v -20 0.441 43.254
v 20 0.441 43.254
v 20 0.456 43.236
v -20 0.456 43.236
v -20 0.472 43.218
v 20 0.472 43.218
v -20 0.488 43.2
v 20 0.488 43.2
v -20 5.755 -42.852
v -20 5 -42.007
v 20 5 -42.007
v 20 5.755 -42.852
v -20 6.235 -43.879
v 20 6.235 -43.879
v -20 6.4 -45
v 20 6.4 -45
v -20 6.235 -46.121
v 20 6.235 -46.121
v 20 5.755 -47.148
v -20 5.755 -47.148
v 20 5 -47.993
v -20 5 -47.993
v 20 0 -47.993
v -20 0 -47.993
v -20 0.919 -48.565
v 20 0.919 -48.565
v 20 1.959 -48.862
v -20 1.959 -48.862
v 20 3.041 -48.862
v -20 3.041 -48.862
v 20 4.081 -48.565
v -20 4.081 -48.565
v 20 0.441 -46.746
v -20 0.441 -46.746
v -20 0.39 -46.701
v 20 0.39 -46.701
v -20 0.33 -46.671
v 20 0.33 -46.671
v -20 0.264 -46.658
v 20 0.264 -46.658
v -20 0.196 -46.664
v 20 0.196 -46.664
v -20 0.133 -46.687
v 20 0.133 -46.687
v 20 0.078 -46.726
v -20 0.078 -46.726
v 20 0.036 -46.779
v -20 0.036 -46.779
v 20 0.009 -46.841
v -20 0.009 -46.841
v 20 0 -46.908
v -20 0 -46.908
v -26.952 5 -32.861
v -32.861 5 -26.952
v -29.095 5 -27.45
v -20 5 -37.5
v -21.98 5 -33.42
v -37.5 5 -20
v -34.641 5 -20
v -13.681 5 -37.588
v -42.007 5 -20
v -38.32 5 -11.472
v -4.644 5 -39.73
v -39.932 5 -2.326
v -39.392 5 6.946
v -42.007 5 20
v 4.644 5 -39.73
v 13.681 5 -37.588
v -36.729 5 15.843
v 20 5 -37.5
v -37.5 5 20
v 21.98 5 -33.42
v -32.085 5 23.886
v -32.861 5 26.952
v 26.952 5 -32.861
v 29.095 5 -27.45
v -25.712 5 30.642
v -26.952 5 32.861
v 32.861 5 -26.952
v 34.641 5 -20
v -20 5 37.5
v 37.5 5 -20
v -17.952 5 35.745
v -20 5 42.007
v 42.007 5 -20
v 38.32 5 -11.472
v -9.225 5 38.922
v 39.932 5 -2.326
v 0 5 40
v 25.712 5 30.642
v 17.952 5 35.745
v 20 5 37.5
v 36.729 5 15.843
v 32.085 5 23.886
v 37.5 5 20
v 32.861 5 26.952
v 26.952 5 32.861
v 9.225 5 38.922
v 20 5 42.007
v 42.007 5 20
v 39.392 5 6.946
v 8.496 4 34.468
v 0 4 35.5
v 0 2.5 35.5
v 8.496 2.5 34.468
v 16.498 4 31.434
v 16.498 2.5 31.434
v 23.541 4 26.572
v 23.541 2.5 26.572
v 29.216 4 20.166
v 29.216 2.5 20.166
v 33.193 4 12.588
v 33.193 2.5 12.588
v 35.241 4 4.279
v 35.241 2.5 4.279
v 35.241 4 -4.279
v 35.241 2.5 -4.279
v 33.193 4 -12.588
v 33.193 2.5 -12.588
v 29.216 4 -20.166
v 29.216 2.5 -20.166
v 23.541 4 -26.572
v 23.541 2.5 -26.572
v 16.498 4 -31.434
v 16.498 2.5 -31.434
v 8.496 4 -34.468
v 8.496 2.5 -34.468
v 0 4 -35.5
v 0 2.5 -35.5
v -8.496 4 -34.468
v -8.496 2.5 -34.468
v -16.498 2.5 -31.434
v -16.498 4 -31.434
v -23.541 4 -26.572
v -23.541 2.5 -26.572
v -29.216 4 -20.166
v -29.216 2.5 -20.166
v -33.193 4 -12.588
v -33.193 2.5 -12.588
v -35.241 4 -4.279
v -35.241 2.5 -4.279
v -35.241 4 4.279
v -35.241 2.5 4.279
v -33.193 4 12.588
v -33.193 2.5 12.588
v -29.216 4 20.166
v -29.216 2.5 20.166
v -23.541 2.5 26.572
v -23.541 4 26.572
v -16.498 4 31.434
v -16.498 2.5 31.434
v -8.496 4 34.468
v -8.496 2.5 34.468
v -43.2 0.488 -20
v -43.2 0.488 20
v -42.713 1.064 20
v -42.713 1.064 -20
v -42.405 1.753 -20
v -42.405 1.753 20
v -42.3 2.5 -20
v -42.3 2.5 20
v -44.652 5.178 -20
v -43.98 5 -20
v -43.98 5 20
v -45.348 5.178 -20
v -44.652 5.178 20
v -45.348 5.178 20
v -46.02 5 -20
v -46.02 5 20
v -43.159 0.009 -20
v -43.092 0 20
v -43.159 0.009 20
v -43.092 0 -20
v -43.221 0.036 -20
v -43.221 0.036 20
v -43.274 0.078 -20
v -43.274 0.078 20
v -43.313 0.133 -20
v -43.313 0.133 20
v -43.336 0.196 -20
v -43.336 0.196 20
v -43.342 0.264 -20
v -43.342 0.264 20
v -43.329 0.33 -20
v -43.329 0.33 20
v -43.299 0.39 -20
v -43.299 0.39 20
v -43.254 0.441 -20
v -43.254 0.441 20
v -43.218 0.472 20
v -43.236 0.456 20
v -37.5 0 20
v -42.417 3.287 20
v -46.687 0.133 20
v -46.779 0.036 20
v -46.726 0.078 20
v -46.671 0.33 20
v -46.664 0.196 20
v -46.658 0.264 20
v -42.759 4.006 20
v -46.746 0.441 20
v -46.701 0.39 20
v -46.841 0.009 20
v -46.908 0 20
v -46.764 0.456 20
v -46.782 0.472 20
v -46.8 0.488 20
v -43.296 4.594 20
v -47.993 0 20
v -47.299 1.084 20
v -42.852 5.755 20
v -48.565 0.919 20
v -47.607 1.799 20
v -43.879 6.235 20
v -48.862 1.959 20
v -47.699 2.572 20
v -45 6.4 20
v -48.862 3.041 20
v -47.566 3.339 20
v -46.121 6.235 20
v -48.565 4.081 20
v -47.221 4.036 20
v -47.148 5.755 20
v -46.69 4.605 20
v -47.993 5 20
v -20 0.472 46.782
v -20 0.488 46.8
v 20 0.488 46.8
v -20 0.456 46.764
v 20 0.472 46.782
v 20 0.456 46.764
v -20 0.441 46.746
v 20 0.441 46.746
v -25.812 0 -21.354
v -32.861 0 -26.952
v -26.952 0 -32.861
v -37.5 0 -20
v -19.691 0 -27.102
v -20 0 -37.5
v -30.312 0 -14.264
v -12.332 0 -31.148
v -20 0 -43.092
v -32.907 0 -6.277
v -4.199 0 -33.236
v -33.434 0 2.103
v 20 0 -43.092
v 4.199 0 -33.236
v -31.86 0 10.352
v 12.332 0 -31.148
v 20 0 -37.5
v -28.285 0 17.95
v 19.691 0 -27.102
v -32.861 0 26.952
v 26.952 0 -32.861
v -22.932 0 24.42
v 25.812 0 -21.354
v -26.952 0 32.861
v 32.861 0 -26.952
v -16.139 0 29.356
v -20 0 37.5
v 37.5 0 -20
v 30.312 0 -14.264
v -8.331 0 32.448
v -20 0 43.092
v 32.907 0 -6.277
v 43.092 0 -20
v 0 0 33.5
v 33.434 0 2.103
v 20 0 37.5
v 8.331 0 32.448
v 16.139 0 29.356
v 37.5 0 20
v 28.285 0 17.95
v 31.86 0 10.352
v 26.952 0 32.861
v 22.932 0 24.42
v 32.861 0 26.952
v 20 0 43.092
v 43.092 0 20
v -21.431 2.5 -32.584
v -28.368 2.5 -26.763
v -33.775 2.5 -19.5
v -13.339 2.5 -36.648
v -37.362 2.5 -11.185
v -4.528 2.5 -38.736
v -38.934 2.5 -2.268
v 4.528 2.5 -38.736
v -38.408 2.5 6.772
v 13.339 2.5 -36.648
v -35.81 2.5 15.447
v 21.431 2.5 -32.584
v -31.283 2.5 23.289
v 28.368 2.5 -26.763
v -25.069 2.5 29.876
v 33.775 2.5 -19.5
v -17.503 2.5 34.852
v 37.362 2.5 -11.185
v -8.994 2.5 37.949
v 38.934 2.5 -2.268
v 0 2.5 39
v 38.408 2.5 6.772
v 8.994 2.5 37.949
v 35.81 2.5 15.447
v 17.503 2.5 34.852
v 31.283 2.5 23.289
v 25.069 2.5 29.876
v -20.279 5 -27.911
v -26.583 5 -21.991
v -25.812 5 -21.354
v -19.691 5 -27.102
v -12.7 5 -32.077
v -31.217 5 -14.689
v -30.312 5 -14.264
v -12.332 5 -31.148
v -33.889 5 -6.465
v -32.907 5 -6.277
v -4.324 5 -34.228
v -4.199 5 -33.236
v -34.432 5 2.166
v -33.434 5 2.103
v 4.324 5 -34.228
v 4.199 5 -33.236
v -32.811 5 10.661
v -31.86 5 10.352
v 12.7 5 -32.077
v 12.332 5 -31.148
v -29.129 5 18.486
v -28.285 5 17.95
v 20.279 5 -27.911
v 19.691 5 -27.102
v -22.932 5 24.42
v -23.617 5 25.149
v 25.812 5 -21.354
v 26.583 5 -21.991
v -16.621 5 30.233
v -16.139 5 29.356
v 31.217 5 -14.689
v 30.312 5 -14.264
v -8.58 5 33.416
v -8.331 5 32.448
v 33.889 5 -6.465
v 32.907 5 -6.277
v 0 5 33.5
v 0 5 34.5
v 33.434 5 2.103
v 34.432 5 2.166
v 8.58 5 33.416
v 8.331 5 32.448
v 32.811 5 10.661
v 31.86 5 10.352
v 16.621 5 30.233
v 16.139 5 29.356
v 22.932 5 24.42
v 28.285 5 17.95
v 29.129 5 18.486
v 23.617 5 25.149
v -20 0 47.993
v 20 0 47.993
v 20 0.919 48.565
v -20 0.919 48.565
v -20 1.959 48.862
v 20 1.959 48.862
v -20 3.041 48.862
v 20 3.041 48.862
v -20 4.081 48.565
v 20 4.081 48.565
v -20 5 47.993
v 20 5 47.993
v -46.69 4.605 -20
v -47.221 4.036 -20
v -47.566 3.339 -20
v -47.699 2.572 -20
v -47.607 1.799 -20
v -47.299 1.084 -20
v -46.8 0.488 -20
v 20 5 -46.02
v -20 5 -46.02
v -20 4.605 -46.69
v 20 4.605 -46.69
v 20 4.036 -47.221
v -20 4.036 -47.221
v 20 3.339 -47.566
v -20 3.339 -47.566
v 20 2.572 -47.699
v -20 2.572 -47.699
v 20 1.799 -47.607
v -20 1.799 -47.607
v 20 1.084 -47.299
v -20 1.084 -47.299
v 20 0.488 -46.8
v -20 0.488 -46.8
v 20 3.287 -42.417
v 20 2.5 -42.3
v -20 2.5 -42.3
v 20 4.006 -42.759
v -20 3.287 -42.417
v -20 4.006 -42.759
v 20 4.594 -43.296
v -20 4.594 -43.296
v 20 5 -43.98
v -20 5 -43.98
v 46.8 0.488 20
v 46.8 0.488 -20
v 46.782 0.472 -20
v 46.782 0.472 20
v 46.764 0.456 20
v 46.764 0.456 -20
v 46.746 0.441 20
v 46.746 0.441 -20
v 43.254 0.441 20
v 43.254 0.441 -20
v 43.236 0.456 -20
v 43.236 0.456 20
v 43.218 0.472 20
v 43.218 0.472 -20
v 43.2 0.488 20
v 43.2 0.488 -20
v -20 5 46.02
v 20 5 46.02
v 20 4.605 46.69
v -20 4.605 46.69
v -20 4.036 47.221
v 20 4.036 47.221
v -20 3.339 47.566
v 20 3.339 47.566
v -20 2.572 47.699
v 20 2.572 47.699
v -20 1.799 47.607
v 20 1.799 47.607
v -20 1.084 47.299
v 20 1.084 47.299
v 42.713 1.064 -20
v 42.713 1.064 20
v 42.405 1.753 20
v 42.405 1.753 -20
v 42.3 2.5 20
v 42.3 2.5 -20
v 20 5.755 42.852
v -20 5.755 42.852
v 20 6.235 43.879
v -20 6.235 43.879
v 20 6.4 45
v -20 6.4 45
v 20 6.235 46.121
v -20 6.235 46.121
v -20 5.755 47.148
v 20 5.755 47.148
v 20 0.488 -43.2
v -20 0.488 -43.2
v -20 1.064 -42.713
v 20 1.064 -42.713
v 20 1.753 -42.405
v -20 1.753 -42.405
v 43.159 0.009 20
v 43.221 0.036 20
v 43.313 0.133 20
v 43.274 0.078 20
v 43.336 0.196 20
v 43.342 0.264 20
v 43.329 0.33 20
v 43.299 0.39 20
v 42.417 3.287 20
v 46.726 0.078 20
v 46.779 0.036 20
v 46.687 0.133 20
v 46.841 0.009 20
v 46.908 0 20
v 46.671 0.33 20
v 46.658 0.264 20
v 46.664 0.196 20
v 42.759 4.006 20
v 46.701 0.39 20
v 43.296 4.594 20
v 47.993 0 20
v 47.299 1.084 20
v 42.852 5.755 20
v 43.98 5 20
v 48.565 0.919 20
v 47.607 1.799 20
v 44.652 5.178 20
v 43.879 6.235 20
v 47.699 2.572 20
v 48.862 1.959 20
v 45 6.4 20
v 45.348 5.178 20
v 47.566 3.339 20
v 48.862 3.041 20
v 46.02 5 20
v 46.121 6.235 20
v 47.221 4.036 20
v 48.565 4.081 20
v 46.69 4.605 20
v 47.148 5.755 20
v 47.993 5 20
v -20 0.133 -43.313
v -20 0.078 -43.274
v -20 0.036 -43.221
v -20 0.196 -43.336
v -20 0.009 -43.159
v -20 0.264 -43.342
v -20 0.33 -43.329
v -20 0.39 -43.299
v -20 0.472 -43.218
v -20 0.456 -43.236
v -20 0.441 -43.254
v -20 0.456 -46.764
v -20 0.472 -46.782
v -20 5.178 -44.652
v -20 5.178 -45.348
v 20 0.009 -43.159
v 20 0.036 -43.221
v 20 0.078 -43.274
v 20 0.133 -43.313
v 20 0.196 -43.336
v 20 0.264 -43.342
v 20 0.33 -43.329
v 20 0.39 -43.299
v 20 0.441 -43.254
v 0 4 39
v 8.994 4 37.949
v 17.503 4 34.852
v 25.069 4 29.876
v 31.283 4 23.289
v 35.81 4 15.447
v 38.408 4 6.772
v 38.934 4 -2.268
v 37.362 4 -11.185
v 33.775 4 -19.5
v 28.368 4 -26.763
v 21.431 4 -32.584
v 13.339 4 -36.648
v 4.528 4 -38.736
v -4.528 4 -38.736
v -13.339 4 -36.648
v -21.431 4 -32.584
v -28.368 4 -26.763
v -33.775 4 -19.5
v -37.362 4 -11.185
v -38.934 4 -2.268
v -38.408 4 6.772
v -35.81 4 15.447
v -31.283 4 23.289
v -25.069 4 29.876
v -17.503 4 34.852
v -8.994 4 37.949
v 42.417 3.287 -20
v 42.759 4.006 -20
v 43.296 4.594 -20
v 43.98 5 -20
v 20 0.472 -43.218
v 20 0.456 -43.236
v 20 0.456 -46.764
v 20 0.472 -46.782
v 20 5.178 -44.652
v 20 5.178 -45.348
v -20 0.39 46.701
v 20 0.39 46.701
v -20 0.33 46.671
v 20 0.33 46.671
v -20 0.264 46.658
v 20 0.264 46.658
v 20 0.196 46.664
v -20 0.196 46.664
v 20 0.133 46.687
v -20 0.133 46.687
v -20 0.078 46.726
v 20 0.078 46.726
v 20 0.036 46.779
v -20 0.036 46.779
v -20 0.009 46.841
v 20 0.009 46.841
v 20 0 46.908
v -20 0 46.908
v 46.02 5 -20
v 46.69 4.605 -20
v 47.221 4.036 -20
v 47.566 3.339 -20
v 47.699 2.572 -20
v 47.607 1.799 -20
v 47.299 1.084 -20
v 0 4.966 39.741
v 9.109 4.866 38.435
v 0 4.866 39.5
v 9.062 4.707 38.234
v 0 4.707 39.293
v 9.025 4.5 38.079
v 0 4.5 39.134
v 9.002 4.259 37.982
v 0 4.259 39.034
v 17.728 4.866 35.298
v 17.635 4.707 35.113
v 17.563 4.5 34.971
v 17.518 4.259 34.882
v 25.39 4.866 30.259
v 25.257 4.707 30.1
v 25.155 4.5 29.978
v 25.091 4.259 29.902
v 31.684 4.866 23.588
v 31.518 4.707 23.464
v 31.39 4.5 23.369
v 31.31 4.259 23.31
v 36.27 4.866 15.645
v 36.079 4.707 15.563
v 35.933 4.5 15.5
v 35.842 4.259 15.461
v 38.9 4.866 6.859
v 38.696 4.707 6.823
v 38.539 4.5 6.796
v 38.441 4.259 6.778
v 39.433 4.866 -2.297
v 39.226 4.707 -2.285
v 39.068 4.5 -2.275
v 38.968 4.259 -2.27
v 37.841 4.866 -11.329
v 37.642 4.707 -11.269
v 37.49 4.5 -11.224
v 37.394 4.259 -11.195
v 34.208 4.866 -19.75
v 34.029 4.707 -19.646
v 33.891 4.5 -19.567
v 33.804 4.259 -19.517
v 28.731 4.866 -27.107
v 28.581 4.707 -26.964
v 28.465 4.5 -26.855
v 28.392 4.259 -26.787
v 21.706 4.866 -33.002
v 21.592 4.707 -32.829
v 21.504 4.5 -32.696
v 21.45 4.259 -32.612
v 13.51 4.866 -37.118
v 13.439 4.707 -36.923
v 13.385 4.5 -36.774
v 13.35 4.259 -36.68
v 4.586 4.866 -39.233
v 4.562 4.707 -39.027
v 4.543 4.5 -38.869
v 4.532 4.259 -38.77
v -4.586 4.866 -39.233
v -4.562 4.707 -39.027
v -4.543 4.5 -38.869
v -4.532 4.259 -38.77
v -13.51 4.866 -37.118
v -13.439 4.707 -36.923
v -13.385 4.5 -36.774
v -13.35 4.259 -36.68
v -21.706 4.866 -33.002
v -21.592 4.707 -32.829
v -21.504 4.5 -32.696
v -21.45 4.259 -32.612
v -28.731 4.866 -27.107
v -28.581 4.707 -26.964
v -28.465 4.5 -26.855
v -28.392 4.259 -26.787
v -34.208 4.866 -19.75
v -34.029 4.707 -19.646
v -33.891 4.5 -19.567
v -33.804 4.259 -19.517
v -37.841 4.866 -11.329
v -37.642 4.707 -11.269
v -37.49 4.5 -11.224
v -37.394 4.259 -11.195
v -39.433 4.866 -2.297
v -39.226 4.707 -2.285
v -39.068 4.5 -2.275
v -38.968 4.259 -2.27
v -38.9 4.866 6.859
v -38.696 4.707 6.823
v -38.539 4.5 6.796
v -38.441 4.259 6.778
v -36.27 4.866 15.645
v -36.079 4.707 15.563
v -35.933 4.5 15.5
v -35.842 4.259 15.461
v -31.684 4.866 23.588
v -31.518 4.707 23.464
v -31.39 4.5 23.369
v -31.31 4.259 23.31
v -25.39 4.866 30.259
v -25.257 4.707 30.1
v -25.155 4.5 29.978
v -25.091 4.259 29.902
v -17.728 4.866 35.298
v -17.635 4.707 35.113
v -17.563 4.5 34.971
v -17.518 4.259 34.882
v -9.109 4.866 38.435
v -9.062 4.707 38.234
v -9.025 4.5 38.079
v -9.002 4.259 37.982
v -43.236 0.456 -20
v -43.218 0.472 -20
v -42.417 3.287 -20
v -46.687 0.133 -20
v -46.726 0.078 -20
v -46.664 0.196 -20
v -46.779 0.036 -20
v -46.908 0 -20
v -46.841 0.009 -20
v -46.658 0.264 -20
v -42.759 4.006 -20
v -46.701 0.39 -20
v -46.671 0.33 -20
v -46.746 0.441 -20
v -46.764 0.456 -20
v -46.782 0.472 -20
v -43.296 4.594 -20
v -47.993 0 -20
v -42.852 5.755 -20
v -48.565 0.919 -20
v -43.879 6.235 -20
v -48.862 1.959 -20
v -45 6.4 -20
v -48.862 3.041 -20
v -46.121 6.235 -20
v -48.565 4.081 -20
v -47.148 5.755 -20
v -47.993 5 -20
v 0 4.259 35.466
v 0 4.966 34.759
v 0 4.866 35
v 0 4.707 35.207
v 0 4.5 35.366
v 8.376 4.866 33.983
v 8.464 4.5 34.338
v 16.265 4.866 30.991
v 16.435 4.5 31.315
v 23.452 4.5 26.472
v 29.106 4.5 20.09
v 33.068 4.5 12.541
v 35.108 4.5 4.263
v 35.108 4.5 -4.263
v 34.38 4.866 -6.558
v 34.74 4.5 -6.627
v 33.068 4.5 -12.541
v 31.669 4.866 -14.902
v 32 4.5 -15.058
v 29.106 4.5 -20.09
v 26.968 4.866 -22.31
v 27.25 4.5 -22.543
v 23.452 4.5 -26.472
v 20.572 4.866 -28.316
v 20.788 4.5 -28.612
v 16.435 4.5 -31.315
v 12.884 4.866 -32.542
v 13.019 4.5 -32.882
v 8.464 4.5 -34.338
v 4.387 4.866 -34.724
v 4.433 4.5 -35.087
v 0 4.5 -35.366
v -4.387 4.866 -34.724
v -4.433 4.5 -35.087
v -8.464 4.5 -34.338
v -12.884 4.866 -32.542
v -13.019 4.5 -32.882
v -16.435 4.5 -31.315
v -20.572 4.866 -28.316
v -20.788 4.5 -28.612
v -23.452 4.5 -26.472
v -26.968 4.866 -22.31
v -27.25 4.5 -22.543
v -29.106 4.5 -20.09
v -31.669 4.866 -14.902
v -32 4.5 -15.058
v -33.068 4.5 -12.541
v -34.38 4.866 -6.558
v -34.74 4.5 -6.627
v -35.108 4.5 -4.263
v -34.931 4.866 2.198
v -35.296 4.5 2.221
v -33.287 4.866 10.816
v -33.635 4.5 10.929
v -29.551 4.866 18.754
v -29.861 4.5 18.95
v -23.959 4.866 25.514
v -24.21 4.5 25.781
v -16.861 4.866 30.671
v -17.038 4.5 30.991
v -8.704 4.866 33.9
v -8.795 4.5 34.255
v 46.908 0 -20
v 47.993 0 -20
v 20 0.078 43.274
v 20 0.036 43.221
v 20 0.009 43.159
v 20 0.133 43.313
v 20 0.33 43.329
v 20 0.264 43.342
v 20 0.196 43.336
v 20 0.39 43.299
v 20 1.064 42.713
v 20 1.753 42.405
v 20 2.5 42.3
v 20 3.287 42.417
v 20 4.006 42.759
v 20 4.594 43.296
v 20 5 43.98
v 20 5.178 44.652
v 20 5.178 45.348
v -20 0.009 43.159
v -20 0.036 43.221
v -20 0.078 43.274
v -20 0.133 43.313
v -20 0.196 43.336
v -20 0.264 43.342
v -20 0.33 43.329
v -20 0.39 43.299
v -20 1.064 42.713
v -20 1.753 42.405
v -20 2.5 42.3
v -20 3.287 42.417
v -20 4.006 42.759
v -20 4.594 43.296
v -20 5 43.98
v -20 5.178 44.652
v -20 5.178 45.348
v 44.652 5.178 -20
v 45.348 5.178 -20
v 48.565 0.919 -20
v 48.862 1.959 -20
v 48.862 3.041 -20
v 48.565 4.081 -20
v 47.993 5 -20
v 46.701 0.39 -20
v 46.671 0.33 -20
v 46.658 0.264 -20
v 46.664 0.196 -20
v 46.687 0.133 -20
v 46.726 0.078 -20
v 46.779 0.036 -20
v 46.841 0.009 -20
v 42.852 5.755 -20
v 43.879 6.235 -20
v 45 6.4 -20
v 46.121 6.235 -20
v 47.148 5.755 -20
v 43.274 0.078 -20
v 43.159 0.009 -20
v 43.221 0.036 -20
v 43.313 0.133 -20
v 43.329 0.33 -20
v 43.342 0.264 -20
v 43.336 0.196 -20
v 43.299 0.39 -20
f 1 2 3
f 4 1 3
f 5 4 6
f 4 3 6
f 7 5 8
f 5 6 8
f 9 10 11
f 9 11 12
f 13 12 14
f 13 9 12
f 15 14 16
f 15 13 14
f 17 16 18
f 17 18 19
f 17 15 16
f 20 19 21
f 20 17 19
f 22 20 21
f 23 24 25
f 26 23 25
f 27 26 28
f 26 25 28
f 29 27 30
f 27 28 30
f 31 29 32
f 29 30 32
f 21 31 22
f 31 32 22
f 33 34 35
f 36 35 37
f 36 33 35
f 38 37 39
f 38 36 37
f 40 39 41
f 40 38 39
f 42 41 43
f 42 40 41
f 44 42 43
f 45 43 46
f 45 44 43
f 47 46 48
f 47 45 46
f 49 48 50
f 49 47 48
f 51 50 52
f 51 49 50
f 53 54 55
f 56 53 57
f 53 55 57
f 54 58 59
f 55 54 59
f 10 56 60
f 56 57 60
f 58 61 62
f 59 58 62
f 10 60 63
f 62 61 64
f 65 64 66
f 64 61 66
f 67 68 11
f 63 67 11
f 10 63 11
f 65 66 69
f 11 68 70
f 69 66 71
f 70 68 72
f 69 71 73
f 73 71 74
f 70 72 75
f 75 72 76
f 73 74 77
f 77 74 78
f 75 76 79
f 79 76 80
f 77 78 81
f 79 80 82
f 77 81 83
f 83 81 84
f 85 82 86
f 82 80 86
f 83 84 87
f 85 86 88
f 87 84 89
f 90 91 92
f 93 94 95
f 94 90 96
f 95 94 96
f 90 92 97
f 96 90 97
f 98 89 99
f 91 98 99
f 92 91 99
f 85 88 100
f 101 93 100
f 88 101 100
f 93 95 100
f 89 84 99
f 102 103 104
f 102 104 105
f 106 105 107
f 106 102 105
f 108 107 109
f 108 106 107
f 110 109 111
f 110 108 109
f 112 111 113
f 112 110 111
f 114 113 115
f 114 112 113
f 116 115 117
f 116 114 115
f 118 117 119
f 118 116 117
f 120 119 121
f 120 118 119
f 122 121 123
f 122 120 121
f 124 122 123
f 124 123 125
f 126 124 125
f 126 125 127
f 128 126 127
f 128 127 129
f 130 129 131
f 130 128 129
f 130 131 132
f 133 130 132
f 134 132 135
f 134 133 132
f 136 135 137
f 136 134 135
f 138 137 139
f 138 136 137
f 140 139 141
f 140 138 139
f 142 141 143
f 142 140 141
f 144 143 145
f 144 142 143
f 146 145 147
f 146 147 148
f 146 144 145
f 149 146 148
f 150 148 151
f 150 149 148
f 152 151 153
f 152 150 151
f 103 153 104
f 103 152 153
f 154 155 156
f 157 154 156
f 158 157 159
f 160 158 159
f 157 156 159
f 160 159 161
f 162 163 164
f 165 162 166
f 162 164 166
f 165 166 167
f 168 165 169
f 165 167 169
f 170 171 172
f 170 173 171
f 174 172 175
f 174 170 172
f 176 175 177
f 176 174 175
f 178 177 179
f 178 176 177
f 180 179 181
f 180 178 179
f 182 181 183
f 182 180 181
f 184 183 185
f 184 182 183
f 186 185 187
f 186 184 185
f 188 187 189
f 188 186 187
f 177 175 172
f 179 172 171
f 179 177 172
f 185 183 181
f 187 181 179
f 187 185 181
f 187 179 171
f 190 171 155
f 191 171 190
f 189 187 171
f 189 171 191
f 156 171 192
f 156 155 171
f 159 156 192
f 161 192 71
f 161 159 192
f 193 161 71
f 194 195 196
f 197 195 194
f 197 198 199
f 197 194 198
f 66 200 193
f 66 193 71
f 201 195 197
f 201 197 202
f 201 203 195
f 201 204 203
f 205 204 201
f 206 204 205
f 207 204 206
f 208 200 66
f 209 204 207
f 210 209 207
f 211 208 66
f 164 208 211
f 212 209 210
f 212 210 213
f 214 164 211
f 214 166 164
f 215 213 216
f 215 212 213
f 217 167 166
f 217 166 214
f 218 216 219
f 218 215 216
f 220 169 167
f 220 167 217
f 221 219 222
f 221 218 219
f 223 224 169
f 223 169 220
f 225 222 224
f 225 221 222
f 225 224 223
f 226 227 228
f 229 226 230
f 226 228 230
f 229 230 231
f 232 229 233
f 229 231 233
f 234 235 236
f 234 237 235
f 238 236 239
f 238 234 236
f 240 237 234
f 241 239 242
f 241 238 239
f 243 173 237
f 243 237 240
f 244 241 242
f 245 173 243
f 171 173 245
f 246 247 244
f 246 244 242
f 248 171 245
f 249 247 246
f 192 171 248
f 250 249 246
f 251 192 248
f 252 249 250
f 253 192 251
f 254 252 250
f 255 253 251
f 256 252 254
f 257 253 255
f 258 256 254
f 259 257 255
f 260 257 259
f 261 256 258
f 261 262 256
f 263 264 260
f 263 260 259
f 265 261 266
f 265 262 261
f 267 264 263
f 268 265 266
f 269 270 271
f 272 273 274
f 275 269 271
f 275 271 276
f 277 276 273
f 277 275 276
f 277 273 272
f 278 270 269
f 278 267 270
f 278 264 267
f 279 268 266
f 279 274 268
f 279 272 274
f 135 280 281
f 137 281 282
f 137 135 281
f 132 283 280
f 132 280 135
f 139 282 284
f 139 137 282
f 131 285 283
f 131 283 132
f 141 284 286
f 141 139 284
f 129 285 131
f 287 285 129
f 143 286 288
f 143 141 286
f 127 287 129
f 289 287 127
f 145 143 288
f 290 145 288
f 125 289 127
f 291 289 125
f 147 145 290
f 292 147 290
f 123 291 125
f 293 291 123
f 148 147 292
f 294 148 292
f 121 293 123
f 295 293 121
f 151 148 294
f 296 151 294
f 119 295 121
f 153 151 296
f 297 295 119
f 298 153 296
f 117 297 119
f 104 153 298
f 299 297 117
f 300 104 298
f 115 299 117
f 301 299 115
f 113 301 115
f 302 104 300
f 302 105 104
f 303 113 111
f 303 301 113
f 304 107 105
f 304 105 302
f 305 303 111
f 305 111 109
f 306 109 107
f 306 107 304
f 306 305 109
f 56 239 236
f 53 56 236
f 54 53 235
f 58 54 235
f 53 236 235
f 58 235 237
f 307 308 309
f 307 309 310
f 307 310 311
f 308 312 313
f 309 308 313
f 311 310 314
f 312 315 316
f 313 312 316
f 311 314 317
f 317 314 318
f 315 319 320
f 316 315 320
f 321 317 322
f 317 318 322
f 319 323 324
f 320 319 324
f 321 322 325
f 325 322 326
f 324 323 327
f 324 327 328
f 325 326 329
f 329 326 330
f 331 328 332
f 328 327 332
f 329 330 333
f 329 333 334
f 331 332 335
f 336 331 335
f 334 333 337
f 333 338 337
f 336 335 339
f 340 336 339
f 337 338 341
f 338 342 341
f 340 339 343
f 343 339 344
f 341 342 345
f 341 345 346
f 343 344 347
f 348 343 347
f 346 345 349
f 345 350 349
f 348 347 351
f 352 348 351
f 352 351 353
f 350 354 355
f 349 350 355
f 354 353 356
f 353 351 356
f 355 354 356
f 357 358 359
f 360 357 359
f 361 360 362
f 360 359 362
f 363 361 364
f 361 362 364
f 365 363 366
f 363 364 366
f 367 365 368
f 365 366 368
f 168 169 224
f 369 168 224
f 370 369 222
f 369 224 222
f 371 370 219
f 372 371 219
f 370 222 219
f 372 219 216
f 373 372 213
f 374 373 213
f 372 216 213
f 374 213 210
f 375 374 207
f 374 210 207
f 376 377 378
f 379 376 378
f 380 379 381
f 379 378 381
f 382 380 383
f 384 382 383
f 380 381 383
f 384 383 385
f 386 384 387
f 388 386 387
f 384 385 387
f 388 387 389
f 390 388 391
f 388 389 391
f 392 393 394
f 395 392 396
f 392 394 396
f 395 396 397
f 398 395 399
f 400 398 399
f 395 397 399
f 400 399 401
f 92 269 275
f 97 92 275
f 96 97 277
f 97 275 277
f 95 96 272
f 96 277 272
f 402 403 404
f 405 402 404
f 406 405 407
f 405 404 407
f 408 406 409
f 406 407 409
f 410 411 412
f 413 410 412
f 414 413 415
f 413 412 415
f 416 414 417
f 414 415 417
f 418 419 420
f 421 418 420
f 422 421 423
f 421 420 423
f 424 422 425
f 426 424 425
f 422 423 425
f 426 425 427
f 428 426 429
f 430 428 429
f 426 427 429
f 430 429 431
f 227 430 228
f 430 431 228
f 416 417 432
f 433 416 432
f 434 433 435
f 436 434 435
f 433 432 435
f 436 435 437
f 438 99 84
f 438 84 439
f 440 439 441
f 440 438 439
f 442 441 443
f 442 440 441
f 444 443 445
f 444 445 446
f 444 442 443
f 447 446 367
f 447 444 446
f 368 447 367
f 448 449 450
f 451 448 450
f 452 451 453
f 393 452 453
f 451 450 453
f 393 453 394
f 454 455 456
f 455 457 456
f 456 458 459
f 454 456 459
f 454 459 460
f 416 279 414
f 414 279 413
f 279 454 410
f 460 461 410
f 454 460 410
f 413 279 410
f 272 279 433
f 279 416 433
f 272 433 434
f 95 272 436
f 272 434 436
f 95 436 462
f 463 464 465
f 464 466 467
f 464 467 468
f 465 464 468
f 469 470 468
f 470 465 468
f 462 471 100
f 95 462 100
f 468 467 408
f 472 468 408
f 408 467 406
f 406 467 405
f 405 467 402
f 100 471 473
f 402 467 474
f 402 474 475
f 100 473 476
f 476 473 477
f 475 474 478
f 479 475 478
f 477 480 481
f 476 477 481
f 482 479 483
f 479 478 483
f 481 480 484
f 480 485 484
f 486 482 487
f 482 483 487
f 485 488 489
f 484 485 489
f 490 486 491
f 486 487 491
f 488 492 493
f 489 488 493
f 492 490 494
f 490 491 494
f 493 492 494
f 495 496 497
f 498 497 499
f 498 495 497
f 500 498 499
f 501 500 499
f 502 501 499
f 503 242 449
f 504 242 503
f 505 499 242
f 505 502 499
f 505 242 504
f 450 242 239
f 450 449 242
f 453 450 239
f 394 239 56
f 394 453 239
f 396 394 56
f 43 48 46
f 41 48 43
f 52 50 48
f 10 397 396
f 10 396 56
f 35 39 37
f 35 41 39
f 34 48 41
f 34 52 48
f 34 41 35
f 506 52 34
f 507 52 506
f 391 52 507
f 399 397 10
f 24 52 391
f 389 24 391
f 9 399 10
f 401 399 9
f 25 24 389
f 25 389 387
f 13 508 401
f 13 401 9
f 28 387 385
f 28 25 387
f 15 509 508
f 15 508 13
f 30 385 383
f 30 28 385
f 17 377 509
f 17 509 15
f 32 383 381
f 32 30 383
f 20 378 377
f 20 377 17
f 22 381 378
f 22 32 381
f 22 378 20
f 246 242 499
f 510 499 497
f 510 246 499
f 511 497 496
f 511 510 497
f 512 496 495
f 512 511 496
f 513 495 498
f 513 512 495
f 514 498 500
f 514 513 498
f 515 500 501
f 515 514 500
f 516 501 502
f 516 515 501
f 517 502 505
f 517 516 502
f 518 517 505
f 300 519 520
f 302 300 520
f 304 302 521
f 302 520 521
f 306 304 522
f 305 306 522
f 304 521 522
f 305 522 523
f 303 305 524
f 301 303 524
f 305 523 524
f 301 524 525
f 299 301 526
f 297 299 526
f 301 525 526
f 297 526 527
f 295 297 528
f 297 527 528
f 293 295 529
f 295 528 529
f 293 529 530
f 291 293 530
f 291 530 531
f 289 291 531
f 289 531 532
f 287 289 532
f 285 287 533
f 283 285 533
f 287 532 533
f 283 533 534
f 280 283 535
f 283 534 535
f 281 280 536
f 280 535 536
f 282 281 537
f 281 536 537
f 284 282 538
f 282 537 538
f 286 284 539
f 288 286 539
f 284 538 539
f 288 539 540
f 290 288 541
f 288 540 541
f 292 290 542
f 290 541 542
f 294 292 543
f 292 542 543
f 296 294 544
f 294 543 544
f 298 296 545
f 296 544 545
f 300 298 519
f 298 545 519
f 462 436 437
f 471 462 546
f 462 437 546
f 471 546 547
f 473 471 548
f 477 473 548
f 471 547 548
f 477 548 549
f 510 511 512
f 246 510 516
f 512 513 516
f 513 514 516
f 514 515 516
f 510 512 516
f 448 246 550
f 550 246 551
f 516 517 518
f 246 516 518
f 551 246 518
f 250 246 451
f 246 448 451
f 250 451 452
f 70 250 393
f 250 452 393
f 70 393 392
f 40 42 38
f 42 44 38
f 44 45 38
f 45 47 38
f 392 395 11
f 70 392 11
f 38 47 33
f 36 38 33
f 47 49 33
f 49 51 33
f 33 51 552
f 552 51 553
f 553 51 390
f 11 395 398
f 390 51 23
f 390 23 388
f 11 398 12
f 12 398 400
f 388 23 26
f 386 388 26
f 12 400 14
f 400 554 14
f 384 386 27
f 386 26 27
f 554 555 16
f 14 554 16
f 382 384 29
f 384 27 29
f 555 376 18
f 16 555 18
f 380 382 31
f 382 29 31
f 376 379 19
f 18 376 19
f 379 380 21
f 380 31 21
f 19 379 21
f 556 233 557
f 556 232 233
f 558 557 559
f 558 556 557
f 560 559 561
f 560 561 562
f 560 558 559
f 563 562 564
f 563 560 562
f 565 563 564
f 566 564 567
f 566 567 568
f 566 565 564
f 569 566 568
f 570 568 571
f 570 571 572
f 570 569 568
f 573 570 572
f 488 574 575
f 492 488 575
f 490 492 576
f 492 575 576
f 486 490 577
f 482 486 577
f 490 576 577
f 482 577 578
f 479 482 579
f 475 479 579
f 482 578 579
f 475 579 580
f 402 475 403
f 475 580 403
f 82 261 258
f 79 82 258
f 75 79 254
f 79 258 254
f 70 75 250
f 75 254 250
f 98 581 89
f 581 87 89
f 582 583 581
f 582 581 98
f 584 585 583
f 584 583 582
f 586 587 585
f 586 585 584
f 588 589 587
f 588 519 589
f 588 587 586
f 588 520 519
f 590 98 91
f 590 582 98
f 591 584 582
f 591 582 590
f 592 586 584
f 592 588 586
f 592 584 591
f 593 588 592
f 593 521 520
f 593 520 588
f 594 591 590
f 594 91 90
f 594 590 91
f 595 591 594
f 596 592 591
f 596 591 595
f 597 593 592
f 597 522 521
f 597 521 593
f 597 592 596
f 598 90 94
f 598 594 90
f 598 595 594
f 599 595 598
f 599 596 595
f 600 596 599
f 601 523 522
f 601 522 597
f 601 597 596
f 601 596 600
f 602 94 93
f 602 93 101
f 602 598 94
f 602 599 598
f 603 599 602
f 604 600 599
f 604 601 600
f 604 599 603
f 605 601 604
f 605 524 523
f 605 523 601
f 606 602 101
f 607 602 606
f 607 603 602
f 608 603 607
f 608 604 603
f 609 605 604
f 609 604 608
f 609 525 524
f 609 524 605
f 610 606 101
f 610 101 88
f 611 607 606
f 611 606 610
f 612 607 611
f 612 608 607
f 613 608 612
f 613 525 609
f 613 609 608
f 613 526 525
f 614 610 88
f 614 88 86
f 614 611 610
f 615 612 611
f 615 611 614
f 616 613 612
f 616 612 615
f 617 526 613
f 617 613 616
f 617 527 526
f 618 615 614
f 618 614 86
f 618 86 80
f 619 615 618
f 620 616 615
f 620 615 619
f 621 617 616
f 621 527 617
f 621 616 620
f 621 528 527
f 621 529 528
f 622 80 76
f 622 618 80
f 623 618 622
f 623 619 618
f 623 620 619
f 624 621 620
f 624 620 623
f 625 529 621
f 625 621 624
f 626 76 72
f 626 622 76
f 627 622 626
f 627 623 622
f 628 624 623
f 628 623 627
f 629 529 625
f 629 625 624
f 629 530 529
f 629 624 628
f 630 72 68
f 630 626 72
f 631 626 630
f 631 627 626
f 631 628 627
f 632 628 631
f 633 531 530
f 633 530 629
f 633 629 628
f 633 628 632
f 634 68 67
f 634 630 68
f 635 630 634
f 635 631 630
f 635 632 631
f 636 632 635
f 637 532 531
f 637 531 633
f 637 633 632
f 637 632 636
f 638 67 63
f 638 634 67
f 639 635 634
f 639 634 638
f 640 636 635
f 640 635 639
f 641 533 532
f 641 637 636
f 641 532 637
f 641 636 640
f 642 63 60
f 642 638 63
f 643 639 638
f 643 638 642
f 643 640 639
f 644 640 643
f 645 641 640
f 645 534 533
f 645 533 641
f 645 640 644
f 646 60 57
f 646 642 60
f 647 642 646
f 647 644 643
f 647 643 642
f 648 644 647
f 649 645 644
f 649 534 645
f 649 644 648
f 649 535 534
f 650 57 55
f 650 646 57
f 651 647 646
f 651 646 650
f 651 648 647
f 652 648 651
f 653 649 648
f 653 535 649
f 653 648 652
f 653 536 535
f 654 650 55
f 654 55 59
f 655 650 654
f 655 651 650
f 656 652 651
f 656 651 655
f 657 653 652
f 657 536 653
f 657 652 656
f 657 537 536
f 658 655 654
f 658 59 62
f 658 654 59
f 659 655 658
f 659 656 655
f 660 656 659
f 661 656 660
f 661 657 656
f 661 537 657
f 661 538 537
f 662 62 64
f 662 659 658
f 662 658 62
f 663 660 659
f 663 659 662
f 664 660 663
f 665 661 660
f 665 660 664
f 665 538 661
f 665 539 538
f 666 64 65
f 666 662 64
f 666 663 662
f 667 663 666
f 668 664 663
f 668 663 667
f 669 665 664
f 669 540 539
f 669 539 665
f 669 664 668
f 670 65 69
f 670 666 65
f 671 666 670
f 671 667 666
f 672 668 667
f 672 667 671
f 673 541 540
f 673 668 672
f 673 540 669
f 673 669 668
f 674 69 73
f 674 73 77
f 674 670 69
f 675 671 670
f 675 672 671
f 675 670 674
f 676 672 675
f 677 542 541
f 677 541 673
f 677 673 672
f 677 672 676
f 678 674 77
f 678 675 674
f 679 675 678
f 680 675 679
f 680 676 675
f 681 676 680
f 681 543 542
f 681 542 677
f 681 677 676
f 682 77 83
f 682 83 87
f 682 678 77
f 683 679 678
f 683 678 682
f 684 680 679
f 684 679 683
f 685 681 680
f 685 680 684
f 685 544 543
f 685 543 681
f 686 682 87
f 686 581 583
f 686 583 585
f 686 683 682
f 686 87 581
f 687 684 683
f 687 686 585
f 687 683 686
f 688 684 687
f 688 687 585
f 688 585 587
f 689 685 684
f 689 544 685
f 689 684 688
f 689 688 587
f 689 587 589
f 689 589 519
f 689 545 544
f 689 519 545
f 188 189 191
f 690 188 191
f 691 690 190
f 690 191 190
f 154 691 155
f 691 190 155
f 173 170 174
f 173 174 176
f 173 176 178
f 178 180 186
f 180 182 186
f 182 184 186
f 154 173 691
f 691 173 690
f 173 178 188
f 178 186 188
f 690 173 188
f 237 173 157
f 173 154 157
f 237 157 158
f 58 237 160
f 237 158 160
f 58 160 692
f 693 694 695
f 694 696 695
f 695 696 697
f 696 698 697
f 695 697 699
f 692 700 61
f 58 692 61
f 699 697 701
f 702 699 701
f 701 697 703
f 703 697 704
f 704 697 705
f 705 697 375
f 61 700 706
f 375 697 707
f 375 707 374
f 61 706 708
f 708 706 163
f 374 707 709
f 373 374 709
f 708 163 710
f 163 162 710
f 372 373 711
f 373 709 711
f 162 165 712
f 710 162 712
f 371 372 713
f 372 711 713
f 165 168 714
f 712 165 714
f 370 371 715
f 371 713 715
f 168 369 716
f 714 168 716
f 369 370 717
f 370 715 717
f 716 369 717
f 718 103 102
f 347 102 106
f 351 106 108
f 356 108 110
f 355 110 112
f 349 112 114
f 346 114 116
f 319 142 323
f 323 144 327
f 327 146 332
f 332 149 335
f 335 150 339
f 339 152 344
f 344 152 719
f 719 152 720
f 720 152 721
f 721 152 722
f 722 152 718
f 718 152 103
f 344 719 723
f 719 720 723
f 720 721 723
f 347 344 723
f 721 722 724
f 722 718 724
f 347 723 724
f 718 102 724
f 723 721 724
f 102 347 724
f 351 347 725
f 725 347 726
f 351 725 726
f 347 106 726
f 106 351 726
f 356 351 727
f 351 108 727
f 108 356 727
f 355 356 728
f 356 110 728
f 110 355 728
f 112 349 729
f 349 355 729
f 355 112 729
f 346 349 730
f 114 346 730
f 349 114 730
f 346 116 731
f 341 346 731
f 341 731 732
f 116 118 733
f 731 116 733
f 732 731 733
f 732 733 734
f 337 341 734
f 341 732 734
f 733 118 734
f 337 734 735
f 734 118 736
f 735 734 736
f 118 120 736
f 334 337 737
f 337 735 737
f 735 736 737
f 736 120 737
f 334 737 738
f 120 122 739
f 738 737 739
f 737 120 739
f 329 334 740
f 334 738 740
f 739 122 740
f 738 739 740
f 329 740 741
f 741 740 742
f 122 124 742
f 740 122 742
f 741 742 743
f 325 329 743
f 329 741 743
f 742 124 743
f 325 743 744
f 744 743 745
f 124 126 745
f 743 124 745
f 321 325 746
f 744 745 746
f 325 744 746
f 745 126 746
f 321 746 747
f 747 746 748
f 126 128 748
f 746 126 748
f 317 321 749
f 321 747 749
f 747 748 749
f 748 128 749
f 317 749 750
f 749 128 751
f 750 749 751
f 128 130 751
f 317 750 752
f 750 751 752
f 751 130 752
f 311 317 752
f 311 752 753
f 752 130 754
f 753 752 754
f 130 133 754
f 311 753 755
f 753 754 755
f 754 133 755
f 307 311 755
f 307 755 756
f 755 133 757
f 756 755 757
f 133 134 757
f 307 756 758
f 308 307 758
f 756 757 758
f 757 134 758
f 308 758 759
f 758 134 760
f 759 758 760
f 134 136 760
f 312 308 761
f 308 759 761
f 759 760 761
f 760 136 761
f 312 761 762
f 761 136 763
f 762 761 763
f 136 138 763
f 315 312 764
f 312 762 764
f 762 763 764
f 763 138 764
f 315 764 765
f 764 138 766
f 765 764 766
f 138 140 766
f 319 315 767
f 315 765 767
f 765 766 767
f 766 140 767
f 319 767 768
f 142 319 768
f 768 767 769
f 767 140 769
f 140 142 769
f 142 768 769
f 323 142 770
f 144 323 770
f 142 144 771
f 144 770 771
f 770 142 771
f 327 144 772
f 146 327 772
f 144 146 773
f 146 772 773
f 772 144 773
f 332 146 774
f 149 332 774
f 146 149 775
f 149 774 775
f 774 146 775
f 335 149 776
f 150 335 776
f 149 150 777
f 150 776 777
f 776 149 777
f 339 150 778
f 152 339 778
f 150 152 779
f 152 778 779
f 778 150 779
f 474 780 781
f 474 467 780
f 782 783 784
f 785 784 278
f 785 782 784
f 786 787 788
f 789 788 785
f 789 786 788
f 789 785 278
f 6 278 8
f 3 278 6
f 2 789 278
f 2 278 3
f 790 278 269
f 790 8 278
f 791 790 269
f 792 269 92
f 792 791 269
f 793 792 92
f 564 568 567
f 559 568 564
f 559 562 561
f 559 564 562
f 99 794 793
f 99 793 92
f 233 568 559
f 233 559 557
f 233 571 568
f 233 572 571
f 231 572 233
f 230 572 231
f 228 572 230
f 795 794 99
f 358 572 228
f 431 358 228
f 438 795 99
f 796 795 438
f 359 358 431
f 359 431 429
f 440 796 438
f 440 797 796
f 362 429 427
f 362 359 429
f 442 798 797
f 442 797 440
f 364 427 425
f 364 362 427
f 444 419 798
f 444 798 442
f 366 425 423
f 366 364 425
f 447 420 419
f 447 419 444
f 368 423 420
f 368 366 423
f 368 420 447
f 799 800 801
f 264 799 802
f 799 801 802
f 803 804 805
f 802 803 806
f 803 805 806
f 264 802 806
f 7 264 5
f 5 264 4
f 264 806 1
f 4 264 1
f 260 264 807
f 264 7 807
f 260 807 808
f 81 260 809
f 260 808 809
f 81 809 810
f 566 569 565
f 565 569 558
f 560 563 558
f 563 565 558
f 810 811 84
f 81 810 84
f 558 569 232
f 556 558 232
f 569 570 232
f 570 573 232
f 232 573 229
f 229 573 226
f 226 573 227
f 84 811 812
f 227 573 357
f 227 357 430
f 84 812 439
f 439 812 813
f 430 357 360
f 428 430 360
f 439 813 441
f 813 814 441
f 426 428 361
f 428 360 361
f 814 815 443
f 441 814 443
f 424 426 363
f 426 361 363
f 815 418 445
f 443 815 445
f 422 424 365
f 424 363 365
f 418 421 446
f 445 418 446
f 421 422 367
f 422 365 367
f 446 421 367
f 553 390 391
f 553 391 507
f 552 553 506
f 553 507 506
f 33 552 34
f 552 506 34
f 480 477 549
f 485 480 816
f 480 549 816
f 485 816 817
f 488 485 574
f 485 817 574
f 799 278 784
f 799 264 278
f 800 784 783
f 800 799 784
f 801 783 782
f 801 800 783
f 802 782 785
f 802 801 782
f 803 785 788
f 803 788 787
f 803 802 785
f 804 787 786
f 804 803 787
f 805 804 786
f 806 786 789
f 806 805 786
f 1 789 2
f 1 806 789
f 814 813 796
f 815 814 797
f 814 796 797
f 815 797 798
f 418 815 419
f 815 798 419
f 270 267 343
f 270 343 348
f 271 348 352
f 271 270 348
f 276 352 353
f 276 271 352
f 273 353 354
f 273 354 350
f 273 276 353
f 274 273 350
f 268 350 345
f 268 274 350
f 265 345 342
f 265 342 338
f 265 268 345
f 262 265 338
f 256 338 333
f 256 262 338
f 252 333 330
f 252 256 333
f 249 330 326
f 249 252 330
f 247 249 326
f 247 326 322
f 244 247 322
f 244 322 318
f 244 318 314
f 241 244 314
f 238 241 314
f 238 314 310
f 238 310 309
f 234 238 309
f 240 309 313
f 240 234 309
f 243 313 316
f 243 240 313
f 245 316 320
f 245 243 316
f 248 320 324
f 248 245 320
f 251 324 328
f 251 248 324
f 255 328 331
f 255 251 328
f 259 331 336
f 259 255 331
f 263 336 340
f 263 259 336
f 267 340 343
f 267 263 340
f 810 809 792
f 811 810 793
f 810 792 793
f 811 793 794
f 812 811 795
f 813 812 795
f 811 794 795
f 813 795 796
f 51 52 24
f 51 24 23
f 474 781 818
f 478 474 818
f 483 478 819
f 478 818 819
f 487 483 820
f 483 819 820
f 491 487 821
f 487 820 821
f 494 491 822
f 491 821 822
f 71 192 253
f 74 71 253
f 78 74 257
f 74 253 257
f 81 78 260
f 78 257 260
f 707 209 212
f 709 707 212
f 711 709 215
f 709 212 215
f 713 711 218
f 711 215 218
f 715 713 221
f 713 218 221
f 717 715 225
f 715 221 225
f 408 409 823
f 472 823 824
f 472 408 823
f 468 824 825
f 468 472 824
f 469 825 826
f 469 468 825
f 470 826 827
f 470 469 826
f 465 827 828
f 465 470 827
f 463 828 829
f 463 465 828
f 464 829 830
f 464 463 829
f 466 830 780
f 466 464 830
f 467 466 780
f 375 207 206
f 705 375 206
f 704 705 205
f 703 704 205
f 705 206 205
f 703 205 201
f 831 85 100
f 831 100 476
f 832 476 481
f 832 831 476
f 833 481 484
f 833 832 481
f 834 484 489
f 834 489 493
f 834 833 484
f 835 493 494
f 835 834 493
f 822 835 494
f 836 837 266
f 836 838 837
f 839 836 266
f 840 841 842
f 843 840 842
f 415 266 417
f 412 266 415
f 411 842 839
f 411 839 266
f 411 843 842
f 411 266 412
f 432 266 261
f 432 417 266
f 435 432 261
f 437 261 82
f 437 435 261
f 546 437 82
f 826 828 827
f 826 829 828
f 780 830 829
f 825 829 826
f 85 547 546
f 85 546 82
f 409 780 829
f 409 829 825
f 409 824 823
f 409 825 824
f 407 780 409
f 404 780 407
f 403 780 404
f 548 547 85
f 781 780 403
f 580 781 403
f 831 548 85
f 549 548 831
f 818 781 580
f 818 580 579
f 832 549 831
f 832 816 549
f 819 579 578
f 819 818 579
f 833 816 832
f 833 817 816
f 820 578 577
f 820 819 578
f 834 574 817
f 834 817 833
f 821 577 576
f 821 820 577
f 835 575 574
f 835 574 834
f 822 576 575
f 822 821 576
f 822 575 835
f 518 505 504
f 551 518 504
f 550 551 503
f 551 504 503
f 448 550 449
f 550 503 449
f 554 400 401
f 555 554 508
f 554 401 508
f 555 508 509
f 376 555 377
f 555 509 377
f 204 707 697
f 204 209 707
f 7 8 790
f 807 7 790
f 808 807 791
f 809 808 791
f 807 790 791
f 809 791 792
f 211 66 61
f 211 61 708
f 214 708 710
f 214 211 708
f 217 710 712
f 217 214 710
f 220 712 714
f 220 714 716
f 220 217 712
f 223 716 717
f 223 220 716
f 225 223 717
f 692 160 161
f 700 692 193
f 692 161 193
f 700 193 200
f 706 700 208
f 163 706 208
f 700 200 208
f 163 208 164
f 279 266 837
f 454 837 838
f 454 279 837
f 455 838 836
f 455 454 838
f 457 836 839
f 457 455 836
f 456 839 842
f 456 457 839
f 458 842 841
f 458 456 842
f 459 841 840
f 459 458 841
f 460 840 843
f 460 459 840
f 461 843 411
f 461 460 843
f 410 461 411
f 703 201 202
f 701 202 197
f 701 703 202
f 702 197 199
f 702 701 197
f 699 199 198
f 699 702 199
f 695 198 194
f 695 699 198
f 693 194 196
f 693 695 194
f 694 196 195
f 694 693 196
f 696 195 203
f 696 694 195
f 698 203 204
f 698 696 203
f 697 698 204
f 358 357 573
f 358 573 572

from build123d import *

# Parameters (mm, degrees)
SKETCH_2_R                        = 42.5
SKETCH_2_R_2                      = 33.5
EXTRUDE_1_DEPTH                   = 5
EXTRUDE_2_REACH                   = 103.012
EXTRUDE_2_END_RADIUS              = 42.5
SKETCH_3_W                        = 40
SKETCH_3_H                        = 5
EXTRUDE_4_DEPTH                   = 40
CUT_EXTRUDE_4_DEPTH               = 40
FILLET_2_R                        = 0.25
PATTERN_CIRCULAR_16_COUNT         = 4
FILLET_2_OF_PATTERN_CIRCULAR_16_R = 0.25
SKETCH_6_R                        = 39
SKETCH_6_R_2                      = 35.5
CUT_EXTRUDE_5_DEPTH               = 2.5
FILLET_3_R                        = 1


with BuildPart() as part:
    # Эскиз2 → Бобышка-Вытянуть1 (new body)
    with BuildSketch(Plane(origin=(0, 0, 0), x_dir=(1, 0, 0), z_dir=(0, 1, 0))):
        with Locations(Location((0, 0, 0), (0, 0, 270))):
            Circle(SKETCH_2_R)
        with Locations(Location((0, 0, 0), (0, 0, 270))):
            Circle(SKETCH_2_R_2, mode=Mode.SUBTRACT)
    extrude(amount=EXTRUDE_1_DEPTH)

    # Бобышка-Вытянуть2: up to this cylinder (the profile starts outside it)
    extrude_2_end = Plane(origin=(0, 2.5, 0), z_dir=(0, -1, 0)) * Cylinder(EXTRUDE_2_END_RADIUS, 292.024, mode=Mode.PRIVATE)
    # Эскиз3 → Бобышка-Вытянуть2 (add, up to the surface)
    with BuildSketch(Plane.XY.offset(49), mode=Mode.PRIVATE) as extrude_2_sk1:
        with Locations((0, 2.5)):
            Rectangle(SKETCH_3_W, SKETCH_3_H)
    extrude_2_tool1 = extrude(extrude_2_sk1.sketch, amount=-EXTRUDE_2_REACH, mode=Mode.PRIVATE) - extrude_2_end
    extrude_2 = extrude_2_tool1.solids().sort_by_distance((0, 2.5, 49))[0]
    add(extrude_2)

    # Эскиз13 → Бобышка-Вытянуть4 (add)
    with BuildSketch(Plane(origin=(20, 0, 0), x_dir=(0, 0, -1), z_dir=(1, 0, 0))):
        with BuildLine():
            ThreePointArc((-47.993325909, 0), (-47.444538755, 0.360952762), (-46.8, 0.48753882))
            ThreePointArc((-46.8, 0.48753882), (-47.660526261, 2.960000014), (-46.019803903, 5))
            Line((-46.019803903, 5), (-47.993325909, 5))
            ThreePointArc((-47.993325909, 5), (-48.9, 2.5), (-47.993325909, 0))
        make_face()
        with BuildLine():
            Line((-47.993325909, 5), (-46.019803903, 5))
            ThreePointArc((-46.019803903, 5), (-45, 5.2), (-43.980196097, 5))
            Line((-43.980196097, 5), (-42.006674091, 5))
            ThreePointArc((-42.006674091, 5), (-45, 6.4), (-47.993325909, 5))
        make_face()
        with BuildLine():
            ThreePointArc((-42.3, 2.5), (-42.535248491, 1.397729616), (-43.2, 0.48753882))
            ThreePointArc((-43.2, 0.48753882), (-42.555461245, 0.360952762), (-42.006674091, 0))
            ThreePointArc((-42.006674091, 0), (-41.333668656, 1.170332945), (-41.1, 2.5))
            ThreePointArc((-41.1, 2.5), (-41.333668656, 3.829667055), (-42.006674091, 5))
            Line((-42.006674091, 5), (-43.980196097, 5))
            ThreePointArc((-43.980196097, 5), (-42.759077139, 4.006075938), (-42.3, 2.5))
        make_face()
        with BuildLine():
            ThreePointArc((-43.980196097, 5), (-45, 5.2), (-46.019803903, 5))
            Line((-46.019803903, 5), (-43.980196097, 5))
        make_face()
    extrude_4 = extrude(amount=-EXTRUDE_4_DEPTH)

    # Эскиз13<3> → Вырез-Вытянуть4 (cut)
    with BuildSketch(Plane(origin=(20, 0, 0), x_dir=(0, 0, -1), z_dir=(1, 0, 0))):
        with BuildLine():
            ThreePointArc((-46.019803903, 5), (-47.660526261, 2.960000014), (-46.8, 0.48753882))
            Line((-46.8, 0.48753882), (-43.2, 0.48753882))
            ThreePointArc((-43.2, 0.48753882), (-42.535248491, 1.397729616), (-42.3, 2.5))
            ThreePointArc((-42.3, 2.5), (-42.759077139, 4.006075938), (-43.980196097, 5))
            Line((-43.980196097, 5), (-46.019803903, 5))
        make_face()
        with BuildLine():
            ThreePointArc((-43.980196097, 5), (-45, 5.2), (-46.019803903, 5))
            Line((-46.019803903, 5), (-43.980196097, 5))
        make_face()
        with BuildLine():
            Line((-43.2, 0.48753882), (-46.8, 0.48753882))
            ThreePointArc((-46.8, 0.48753882), (-46.430820407, 0.210294132), (-46.019803903, 0))
            Line((-46.019803903, 0), (-43.980196097, 0))
            ThreePointArc((-43.980196097, 0), (-43.569179593, 0.210294132), (-43.2, 0.48753882))
        make_face()
        with BuildLine():
            Line((-49, 0), (-47.993325909, 0))
            ThreePointArc((-47.993325909, 0), (-48.9, 2.5), (-47.993325909, 5))
            Line((-47.993325909, 5), (-49, 5))
            Line((-49, 5), (-49, 0))
        make_face()
    cut_extrude_4 = extrude(amount=-CUT_EXTRUDE_4_DEPTH, mode=Mode.SUBTRACT)

    # Скругление2
    fillet_2_edges = [part.edges().sort_by_distance(p)[0] for p in [
        (0, 0, 43.980196097),
        (0, 0, 46.019803903),
    ]]
    fillet(fillet_2_edges, radius=FILLET_2_R)

    # Круговой массив16: Бобышка-Вытянуть2, Бобышка-Вытянуть4, Вырез-Вытянуть4 ×4 about axis
    pattern_circular_16_axis = Axis((0, 0, 0), (0, 1, 0))
    add([extrude_2.rotate(pattern_circular_16_axis, i * 360 / PATTERN_CIRCULAR_16_COUNT) for i in range(1, PATTERN_CIRCULAR_16_COUNT)])
    add([extrude_4.rotate(pattern_circular_16_axis, i * 360 / PATTERN_CIRCULAR_16_COUNT) for i in range(1, PATTERN_CIRCULAR_16_COUNT)])
    add([cut_extrude_4.rotate(pattern_circular_16_axis, i * 360 / PATTERN_CIRCULAR_16_COUNT) for i in range(1, PATTERN_CIRCULAR_16_COUNT)], mode=Mode.SUBTRACT)

    # Скругление2 of Круговой массив16
    fillet_2_of_pattern_circular_16_edges = [part.edges().sort_by_distance(p)[0] for p in [
        (43.980196097, 0, 0),
        (46.019803903, 0, 0),
        (0, 0, -43.980196097),
        (0, 0, -46.019803903),
        (-43.980196097, 0, 0),
        (-46.019803903, 0, 0),
    ]]
    fillet(fillet_2_of_pattern_circular_16_edges, radius=FILLET_2_OF_PATTERN_CIRCULAR_16_R)

    # Эскиз6 → Вырез-Вытянуть5 (cut)
    with BuildSketch(Plane(origin=(0, 5, 0), x_dir=(1, 0, 0), z_dir=(0, 1, 0))):
        with Locations(Location((0, 0, 0), (0, 0, 270))):
            Circle(SKETCH_6_R)
        with Locations(Location((0, 0, 0), (0, 0, 270))):
            Circle(SKETCH_6_R_2, mode=Mode.SUBTRACT)
    extrude(amount=-CUT_EXTRUDE_5_DEPTH, mode=Mode.SUBTRACT)

    # Скругление3
    fillet_3_edges = [part.edges().sort_by_distance(p)[0] for p in [
        (0, 5, -39),
        (0, 5, -35.5),
    ]]
    fillet(fillet_3_edges, radius=FILLET_3_R)


solid = part.part
